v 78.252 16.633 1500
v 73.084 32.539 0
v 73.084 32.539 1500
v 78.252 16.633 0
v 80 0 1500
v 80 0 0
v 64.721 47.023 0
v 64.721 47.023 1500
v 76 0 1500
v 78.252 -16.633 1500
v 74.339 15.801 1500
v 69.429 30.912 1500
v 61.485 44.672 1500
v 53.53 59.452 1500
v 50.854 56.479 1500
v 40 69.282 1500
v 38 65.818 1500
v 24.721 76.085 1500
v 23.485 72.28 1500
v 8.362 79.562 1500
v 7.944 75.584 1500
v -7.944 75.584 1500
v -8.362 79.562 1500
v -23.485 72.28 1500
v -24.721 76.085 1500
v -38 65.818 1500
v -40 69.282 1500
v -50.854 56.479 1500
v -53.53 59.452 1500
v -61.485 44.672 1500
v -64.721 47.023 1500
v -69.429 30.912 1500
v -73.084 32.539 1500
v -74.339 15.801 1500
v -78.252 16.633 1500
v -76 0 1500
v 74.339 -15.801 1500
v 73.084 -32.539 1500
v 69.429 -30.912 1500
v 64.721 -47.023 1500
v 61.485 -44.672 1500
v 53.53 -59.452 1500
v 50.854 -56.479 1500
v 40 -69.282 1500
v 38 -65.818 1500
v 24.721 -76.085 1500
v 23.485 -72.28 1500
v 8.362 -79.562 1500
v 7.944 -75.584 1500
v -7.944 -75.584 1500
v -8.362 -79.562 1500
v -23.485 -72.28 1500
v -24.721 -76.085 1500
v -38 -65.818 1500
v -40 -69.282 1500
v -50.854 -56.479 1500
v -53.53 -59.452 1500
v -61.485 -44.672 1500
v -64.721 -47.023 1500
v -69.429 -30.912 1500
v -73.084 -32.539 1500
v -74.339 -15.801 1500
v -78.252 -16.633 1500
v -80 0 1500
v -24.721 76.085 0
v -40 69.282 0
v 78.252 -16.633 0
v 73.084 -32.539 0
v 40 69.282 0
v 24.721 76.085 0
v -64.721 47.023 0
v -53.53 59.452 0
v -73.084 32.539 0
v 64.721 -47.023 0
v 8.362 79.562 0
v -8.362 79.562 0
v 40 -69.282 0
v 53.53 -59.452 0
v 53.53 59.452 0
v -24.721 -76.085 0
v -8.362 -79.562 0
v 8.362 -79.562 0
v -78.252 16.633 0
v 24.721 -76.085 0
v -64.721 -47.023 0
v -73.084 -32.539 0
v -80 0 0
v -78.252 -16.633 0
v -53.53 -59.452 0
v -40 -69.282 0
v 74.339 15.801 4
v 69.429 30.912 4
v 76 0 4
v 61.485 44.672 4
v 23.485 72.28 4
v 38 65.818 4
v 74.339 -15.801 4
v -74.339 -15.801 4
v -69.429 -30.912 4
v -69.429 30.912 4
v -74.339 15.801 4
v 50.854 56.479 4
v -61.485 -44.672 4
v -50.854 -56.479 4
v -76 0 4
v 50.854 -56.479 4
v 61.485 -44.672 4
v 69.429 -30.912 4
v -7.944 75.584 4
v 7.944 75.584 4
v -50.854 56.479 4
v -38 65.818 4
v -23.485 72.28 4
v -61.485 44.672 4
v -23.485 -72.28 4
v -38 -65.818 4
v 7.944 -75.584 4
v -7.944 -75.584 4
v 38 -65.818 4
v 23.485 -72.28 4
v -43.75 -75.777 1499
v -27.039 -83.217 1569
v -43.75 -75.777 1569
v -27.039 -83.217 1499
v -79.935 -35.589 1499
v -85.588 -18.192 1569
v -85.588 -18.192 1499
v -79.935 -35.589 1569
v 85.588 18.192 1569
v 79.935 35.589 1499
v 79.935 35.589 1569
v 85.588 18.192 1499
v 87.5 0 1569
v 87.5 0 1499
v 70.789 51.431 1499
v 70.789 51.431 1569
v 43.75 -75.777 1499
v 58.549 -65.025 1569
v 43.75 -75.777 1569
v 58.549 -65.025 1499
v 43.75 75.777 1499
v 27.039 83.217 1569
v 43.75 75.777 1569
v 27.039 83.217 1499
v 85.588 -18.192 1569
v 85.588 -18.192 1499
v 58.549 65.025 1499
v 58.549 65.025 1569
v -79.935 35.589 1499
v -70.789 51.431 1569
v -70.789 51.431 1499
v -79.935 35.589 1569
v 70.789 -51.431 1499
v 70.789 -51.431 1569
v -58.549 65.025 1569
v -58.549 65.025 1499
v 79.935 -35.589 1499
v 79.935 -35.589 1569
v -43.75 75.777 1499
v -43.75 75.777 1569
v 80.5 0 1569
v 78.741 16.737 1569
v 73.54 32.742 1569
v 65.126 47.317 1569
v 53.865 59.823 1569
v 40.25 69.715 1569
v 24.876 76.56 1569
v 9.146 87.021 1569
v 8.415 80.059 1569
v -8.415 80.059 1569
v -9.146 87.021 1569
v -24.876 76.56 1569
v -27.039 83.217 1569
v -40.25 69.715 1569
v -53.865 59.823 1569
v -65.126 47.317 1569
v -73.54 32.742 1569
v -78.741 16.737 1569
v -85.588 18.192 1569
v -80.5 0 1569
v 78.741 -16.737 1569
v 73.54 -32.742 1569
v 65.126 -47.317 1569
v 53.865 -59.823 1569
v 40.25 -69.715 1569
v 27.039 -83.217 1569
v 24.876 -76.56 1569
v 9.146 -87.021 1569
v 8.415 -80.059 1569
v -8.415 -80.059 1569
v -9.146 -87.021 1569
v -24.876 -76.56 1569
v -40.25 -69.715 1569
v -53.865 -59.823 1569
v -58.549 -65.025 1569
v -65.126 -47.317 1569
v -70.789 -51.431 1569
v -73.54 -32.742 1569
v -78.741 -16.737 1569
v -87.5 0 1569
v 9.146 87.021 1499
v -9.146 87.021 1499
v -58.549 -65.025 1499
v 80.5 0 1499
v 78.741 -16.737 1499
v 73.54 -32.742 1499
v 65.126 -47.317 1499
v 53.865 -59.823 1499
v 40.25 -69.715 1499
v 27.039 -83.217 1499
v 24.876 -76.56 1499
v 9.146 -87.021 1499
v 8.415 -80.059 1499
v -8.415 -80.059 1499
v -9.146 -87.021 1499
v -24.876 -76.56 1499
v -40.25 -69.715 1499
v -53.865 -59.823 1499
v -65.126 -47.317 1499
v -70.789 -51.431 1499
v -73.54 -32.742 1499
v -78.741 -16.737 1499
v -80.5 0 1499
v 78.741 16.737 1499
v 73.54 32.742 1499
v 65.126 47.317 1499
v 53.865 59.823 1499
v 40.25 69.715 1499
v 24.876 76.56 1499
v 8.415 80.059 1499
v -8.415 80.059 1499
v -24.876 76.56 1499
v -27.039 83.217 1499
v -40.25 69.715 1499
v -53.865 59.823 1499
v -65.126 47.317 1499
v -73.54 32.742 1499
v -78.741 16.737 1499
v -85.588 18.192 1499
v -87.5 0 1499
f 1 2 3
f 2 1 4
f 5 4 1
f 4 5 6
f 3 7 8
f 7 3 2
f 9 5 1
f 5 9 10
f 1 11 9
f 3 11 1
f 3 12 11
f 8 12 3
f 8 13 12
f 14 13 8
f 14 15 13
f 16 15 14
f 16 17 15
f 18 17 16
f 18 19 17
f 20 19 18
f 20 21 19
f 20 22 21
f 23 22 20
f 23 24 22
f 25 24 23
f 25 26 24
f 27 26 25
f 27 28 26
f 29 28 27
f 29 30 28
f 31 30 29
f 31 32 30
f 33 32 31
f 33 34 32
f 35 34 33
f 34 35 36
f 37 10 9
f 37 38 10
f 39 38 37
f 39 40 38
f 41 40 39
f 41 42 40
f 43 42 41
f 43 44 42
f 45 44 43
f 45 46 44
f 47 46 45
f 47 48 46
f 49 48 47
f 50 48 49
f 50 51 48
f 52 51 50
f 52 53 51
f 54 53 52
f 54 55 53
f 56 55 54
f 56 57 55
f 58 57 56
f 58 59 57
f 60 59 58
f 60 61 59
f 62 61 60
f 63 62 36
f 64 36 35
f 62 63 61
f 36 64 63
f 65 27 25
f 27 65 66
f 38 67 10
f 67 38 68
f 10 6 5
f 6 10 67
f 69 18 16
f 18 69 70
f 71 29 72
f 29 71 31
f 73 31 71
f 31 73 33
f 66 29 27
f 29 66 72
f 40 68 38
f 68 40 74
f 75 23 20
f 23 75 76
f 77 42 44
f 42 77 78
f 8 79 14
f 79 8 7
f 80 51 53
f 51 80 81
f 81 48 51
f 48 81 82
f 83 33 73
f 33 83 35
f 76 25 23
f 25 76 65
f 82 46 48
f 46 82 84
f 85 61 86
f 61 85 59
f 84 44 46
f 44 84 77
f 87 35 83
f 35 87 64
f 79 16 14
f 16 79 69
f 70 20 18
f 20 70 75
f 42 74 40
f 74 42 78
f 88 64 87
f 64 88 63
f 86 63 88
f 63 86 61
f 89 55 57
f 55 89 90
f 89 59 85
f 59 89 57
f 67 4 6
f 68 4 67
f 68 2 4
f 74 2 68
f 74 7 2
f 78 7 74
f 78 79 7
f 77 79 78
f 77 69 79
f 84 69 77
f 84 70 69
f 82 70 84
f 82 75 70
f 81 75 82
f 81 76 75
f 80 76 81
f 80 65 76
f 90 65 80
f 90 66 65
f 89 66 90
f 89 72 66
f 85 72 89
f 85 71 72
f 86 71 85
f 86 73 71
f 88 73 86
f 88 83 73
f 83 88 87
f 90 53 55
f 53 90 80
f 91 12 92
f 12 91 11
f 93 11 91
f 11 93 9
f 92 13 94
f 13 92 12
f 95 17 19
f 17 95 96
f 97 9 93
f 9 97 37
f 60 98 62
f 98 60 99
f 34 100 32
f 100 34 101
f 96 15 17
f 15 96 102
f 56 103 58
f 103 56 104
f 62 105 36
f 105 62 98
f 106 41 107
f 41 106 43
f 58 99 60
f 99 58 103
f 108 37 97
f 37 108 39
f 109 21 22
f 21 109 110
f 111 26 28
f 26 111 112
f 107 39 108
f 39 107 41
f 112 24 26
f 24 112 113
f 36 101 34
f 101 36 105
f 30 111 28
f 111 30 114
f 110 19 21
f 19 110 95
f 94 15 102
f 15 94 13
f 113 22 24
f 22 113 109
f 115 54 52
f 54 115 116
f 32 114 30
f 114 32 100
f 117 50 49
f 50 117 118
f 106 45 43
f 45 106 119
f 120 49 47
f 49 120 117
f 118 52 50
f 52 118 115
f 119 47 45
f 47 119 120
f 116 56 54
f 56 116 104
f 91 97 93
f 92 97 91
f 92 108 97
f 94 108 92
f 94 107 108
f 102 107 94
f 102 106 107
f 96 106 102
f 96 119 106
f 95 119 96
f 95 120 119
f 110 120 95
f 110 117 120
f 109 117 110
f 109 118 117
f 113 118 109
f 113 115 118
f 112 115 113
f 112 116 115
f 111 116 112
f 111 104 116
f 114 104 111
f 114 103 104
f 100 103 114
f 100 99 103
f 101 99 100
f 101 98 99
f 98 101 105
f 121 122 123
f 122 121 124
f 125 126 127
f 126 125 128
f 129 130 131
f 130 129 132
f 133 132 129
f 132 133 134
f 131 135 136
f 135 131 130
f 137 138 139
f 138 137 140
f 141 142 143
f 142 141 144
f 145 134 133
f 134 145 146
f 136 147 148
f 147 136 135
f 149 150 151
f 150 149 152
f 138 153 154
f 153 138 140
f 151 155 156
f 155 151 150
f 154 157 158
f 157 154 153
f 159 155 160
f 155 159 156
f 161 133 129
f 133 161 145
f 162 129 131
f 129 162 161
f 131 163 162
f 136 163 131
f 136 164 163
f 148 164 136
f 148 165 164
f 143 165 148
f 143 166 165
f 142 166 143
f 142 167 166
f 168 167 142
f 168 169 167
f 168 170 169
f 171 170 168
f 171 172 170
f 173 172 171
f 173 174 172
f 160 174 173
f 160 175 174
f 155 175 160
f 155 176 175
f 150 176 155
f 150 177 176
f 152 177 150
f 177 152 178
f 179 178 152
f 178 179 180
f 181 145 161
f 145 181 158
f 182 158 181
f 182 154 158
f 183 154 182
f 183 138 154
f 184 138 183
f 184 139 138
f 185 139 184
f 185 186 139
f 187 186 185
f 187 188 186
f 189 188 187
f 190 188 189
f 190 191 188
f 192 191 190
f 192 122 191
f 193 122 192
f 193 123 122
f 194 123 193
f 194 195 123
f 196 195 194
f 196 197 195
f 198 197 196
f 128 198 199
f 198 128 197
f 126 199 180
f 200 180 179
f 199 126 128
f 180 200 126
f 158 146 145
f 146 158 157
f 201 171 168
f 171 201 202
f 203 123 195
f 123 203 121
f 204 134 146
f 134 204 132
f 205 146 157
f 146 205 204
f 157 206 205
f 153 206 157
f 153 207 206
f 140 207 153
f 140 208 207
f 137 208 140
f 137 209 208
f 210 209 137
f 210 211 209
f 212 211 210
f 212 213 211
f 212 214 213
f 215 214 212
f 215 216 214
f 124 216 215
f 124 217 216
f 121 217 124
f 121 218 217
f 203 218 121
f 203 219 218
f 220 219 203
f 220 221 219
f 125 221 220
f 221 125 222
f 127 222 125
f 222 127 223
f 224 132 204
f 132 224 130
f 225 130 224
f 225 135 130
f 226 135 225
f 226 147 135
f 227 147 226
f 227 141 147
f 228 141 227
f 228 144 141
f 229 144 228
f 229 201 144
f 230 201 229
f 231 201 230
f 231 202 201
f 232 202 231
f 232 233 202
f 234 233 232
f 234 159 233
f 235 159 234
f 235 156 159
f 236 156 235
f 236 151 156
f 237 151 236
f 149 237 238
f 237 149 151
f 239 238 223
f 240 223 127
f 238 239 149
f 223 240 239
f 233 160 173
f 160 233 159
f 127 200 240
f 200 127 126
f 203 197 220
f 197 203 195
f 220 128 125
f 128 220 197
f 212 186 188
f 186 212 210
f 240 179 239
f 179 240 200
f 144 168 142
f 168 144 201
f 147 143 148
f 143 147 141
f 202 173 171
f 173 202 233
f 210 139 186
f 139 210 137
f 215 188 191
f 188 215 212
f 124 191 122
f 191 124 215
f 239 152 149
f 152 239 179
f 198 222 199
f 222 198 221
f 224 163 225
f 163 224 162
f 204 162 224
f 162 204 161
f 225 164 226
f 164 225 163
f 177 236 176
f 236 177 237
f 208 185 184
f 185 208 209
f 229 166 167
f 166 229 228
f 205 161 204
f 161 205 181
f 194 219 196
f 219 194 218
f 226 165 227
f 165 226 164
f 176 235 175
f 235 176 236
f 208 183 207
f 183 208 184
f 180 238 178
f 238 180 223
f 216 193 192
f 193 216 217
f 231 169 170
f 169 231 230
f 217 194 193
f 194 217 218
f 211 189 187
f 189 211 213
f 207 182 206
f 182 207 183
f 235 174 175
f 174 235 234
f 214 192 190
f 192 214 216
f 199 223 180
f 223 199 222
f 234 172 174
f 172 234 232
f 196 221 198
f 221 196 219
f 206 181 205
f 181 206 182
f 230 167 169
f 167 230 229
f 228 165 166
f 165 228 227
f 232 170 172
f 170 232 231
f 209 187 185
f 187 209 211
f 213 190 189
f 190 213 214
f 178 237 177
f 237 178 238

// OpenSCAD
// Parameters
nominal_size = 160; //[80:320:1]
length_mm = 1500; //[750:3000:10]
od_mm = 160; //[120:240:1]
wall_mm = 4.0; //[2.0:8.0:0.1]
fit_len_mm = 70; //[40:140:1]
fit_od_mm = 175; //[160:220:1]
fit_wall_mm = 5.0; //[2.5:10.0:0.1]
overlap_mm = 1.0; //[0.5:2.0:0.1]
clearance_mm = 0.5; //[0.2:1.5:0.1]

// HT Pipe Segment - Complete geometry
module ht_pipe() {
  color([0.85, 0.85, 0.8]) { // PVC color
    union() {
      // Pipe segment
      difference() {
        cylinder(h=length_mm, r=od_mm/2, center=false);
        translate([0, 0, wall_mm])
          cylinder(h=length_mm, r=od_mm/2 - wall_mm, center=false);
      }
      // Integrated end fitting
      translate([0, 0, length_mm - overlap_mm])
        difference() {
          cylinder(h=fit_len_mm, r=fit_od_mm/2, center=false);
          cylinder(h=fit_len_mm, r=od_mm/2 + clearance_mm, center=false);
        }
    }
  }
}

// Assembly
module assembly() {
  ht_pipe();
}

assembly();
